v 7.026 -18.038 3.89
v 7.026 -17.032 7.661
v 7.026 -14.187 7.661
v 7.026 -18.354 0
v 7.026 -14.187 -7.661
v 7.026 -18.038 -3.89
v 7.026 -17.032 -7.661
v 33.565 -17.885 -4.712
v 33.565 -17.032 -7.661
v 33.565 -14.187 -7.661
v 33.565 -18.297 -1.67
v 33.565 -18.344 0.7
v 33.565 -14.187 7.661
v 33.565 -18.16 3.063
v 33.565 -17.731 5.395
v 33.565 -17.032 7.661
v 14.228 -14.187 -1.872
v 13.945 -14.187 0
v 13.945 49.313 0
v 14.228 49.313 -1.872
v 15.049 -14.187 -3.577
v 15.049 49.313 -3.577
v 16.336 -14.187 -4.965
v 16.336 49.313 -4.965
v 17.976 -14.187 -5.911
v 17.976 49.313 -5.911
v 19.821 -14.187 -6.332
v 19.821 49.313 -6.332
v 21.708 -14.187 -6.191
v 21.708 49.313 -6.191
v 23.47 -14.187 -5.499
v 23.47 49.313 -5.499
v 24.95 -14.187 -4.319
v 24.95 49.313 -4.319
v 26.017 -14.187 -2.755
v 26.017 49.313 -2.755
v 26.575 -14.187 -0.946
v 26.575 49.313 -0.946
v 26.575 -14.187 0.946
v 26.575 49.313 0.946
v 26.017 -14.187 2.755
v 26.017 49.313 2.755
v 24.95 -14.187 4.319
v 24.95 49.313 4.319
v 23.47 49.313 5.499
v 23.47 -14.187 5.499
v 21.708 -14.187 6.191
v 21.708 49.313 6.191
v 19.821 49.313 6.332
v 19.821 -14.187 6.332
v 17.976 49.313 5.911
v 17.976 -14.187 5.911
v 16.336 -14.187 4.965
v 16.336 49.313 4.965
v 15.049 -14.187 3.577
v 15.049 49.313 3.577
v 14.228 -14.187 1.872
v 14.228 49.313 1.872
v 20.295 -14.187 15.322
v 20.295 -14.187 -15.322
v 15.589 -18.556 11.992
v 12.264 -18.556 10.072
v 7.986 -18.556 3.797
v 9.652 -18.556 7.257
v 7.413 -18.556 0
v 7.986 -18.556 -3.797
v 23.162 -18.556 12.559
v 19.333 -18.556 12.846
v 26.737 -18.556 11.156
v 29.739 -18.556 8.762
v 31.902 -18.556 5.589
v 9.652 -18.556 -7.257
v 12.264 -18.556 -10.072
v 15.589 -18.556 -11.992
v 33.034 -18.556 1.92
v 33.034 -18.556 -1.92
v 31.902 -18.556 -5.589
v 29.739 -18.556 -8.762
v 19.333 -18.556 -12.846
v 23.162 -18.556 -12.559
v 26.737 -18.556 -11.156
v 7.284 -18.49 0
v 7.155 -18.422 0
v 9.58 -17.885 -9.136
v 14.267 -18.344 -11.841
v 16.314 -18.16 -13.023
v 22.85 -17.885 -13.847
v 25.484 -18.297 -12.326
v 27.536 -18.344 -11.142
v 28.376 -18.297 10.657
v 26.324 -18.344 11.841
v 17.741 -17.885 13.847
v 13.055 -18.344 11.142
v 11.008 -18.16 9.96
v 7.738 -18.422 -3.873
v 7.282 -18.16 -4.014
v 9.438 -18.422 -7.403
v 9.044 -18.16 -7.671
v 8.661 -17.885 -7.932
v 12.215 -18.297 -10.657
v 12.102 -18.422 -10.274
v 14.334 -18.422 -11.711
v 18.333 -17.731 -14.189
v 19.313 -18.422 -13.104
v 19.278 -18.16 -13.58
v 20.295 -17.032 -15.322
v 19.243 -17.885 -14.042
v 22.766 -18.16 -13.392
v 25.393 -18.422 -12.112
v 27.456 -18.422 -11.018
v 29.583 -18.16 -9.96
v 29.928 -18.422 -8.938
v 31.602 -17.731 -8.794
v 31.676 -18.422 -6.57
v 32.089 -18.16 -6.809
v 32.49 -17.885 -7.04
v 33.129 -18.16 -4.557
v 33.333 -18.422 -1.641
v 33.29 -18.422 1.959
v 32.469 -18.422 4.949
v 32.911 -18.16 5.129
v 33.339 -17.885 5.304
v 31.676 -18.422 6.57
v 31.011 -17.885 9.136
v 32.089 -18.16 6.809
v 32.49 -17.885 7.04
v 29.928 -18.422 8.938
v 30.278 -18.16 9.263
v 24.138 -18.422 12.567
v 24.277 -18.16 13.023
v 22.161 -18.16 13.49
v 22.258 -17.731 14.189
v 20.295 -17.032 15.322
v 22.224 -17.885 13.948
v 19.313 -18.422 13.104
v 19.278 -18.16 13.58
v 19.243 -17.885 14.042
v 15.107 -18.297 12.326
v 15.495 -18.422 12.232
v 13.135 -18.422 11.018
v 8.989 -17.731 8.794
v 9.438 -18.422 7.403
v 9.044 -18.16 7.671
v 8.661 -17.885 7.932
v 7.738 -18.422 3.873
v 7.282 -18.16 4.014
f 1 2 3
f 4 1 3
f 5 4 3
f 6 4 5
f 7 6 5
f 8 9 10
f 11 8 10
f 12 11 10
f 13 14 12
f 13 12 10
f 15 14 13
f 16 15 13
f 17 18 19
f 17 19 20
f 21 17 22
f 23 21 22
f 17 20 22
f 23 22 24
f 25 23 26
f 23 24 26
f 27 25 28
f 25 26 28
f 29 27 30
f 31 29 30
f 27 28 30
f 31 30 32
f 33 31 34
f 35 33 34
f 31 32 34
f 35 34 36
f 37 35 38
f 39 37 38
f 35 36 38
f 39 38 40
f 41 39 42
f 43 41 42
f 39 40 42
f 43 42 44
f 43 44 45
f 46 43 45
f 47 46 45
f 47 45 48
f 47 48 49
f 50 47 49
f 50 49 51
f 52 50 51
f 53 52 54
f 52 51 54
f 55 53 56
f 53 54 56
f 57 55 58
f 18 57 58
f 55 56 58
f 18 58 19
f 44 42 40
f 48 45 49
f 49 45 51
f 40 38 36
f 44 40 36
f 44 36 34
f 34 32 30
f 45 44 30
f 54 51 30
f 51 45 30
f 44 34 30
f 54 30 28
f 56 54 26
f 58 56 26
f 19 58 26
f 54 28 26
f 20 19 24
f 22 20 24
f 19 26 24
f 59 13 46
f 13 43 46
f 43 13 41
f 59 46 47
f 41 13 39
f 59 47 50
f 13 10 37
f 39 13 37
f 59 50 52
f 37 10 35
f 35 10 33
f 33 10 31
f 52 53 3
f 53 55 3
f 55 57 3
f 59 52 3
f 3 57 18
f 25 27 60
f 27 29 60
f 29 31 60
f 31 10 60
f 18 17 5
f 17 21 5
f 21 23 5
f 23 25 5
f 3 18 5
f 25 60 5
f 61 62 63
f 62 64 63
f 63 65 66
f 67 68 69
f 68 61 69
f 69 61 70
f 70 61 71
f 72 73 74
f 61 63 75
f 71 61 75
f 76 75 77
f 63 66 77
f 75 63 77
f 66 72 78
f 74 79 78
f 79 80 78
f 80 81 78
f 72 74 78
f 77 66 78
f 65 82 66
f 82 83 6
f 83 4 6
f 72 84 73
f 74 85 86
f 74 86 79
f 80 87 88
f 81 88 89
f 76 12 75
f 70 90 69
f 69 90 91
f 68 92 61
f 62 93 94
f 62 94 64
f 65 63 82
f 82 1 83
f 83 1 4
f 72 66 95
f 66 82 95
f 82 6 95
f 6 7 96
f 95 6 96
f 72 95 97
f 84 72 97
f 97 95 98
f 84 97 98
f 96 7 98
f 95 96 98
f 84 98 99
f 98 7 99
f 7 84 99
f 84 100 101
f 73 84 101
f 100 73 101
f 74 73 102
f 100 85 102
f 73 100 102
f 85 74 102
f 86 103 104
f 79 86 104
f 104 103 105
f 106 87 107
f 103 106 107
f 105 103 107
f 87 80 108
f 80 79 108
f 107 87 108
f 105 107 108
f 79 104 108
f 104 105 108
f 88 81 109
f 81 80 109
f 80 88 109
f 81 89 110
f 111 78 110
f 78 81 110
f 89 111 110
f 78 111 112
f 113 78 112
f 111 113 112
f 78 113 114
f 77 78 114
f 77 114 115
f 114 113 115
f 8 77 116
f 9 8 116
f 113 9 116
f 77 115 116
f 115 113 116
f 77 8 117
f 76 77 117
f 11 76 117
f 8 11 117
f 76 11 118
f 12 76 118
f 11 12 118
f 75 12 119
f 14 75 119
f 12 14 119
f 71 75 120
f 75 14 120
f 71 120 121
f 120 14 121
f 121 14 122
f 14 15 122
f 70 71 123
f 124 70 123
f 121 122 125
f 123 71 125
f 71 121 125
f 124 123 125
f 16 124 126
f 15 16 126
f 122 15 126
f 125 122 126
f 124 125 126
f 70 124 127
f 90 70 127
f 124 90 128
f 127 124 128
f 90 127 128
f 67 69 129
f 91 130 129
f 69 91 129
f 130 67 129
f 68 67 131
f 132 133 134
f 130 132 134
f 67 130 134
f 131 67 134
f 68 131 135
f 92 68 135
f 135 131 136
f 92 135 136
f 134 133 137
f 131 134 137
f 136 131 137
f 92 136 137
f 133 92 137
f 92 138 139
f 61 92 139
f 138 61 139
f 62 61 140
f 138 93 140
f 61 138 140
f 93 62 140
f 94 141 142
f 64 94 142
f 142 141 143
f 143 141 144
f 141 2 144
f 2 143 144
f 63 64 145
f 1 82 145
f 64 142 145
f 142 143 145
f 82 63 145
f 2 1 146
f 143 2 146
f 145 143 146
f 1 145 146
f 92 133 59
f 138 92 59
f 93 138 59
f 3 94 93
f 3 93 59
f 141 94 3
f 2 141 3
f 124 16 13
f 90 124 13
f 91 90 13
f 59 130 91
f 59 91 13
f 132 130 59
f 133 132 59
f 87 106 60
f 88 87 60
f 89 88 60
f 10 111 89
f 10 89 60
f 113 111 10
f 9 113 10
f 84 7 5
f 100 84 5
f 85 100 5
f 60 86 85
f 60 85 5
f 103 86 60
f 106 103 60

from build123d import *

# Parameters (mm, degrees)
SKETCH2_OUTSIDE_W  = 48.751
SKETCH2_OUTSIDE_H  = 48.752
CUT_EXTRUDE1_DEPTH = 79.163904494


with BuildPart() as part:
    # Sketch1 → Revolve1 (revolve)
    with BuildSketch(Plane.XY):
        with BuildLine():
            Line((13.945442694, -14.186787019), (13.945442694, -1.101180597))
            Line((13.945442694, -1.101180597), (13.945442694, 49.313212981))
            Line((13.945442694, 49.313212981), (20.295442694, 49.313212981))
            Line((20.295442694, 49.313212981), (20.295442694, -18.555587019))
            Line((20.295442694, -18.555587019), (7.413252884, -18.555587019))
            ThreePointArc((7.413252884, -18.555587019), (6.158112274, -17.849568811), (4.972892694, -17.031587019))
            Line((4.972892694, -17.031587019), (4.972892694, -14.186787019))
            Line((4.972892694, -14.186787019), (13.945442694, -14.186787019))
        make_face()
    revolve(axis=Axis((20.295442694, 49.313212981, 0), (0, -1, 0)))

    # Sketch2 outside → Cut-Extrude1 (cut, through all)
    with BuildSketch(Plane.XZ.offset(18.555587019)):
        with Locations((20.2955, 0)):
            Rectangle(SKETCH2_OUTSIDE_W, SKETCH2_OUTSIDE_H)
        Polygon((20.295442694, 15.322011053), (7.026191885, 7.661005527), (7.026191885, -7.661005527), (20.295442694, -15.322011053), (33.564693504, -7.661005527), (33.564693504, 7.661005527), align=None, mode=Mode.SUBTRACT)
    extrude(amount=-CUT_EXTRUDE1_DEPTH, mode=Mode.SUBTRACT)


solid = part.part
